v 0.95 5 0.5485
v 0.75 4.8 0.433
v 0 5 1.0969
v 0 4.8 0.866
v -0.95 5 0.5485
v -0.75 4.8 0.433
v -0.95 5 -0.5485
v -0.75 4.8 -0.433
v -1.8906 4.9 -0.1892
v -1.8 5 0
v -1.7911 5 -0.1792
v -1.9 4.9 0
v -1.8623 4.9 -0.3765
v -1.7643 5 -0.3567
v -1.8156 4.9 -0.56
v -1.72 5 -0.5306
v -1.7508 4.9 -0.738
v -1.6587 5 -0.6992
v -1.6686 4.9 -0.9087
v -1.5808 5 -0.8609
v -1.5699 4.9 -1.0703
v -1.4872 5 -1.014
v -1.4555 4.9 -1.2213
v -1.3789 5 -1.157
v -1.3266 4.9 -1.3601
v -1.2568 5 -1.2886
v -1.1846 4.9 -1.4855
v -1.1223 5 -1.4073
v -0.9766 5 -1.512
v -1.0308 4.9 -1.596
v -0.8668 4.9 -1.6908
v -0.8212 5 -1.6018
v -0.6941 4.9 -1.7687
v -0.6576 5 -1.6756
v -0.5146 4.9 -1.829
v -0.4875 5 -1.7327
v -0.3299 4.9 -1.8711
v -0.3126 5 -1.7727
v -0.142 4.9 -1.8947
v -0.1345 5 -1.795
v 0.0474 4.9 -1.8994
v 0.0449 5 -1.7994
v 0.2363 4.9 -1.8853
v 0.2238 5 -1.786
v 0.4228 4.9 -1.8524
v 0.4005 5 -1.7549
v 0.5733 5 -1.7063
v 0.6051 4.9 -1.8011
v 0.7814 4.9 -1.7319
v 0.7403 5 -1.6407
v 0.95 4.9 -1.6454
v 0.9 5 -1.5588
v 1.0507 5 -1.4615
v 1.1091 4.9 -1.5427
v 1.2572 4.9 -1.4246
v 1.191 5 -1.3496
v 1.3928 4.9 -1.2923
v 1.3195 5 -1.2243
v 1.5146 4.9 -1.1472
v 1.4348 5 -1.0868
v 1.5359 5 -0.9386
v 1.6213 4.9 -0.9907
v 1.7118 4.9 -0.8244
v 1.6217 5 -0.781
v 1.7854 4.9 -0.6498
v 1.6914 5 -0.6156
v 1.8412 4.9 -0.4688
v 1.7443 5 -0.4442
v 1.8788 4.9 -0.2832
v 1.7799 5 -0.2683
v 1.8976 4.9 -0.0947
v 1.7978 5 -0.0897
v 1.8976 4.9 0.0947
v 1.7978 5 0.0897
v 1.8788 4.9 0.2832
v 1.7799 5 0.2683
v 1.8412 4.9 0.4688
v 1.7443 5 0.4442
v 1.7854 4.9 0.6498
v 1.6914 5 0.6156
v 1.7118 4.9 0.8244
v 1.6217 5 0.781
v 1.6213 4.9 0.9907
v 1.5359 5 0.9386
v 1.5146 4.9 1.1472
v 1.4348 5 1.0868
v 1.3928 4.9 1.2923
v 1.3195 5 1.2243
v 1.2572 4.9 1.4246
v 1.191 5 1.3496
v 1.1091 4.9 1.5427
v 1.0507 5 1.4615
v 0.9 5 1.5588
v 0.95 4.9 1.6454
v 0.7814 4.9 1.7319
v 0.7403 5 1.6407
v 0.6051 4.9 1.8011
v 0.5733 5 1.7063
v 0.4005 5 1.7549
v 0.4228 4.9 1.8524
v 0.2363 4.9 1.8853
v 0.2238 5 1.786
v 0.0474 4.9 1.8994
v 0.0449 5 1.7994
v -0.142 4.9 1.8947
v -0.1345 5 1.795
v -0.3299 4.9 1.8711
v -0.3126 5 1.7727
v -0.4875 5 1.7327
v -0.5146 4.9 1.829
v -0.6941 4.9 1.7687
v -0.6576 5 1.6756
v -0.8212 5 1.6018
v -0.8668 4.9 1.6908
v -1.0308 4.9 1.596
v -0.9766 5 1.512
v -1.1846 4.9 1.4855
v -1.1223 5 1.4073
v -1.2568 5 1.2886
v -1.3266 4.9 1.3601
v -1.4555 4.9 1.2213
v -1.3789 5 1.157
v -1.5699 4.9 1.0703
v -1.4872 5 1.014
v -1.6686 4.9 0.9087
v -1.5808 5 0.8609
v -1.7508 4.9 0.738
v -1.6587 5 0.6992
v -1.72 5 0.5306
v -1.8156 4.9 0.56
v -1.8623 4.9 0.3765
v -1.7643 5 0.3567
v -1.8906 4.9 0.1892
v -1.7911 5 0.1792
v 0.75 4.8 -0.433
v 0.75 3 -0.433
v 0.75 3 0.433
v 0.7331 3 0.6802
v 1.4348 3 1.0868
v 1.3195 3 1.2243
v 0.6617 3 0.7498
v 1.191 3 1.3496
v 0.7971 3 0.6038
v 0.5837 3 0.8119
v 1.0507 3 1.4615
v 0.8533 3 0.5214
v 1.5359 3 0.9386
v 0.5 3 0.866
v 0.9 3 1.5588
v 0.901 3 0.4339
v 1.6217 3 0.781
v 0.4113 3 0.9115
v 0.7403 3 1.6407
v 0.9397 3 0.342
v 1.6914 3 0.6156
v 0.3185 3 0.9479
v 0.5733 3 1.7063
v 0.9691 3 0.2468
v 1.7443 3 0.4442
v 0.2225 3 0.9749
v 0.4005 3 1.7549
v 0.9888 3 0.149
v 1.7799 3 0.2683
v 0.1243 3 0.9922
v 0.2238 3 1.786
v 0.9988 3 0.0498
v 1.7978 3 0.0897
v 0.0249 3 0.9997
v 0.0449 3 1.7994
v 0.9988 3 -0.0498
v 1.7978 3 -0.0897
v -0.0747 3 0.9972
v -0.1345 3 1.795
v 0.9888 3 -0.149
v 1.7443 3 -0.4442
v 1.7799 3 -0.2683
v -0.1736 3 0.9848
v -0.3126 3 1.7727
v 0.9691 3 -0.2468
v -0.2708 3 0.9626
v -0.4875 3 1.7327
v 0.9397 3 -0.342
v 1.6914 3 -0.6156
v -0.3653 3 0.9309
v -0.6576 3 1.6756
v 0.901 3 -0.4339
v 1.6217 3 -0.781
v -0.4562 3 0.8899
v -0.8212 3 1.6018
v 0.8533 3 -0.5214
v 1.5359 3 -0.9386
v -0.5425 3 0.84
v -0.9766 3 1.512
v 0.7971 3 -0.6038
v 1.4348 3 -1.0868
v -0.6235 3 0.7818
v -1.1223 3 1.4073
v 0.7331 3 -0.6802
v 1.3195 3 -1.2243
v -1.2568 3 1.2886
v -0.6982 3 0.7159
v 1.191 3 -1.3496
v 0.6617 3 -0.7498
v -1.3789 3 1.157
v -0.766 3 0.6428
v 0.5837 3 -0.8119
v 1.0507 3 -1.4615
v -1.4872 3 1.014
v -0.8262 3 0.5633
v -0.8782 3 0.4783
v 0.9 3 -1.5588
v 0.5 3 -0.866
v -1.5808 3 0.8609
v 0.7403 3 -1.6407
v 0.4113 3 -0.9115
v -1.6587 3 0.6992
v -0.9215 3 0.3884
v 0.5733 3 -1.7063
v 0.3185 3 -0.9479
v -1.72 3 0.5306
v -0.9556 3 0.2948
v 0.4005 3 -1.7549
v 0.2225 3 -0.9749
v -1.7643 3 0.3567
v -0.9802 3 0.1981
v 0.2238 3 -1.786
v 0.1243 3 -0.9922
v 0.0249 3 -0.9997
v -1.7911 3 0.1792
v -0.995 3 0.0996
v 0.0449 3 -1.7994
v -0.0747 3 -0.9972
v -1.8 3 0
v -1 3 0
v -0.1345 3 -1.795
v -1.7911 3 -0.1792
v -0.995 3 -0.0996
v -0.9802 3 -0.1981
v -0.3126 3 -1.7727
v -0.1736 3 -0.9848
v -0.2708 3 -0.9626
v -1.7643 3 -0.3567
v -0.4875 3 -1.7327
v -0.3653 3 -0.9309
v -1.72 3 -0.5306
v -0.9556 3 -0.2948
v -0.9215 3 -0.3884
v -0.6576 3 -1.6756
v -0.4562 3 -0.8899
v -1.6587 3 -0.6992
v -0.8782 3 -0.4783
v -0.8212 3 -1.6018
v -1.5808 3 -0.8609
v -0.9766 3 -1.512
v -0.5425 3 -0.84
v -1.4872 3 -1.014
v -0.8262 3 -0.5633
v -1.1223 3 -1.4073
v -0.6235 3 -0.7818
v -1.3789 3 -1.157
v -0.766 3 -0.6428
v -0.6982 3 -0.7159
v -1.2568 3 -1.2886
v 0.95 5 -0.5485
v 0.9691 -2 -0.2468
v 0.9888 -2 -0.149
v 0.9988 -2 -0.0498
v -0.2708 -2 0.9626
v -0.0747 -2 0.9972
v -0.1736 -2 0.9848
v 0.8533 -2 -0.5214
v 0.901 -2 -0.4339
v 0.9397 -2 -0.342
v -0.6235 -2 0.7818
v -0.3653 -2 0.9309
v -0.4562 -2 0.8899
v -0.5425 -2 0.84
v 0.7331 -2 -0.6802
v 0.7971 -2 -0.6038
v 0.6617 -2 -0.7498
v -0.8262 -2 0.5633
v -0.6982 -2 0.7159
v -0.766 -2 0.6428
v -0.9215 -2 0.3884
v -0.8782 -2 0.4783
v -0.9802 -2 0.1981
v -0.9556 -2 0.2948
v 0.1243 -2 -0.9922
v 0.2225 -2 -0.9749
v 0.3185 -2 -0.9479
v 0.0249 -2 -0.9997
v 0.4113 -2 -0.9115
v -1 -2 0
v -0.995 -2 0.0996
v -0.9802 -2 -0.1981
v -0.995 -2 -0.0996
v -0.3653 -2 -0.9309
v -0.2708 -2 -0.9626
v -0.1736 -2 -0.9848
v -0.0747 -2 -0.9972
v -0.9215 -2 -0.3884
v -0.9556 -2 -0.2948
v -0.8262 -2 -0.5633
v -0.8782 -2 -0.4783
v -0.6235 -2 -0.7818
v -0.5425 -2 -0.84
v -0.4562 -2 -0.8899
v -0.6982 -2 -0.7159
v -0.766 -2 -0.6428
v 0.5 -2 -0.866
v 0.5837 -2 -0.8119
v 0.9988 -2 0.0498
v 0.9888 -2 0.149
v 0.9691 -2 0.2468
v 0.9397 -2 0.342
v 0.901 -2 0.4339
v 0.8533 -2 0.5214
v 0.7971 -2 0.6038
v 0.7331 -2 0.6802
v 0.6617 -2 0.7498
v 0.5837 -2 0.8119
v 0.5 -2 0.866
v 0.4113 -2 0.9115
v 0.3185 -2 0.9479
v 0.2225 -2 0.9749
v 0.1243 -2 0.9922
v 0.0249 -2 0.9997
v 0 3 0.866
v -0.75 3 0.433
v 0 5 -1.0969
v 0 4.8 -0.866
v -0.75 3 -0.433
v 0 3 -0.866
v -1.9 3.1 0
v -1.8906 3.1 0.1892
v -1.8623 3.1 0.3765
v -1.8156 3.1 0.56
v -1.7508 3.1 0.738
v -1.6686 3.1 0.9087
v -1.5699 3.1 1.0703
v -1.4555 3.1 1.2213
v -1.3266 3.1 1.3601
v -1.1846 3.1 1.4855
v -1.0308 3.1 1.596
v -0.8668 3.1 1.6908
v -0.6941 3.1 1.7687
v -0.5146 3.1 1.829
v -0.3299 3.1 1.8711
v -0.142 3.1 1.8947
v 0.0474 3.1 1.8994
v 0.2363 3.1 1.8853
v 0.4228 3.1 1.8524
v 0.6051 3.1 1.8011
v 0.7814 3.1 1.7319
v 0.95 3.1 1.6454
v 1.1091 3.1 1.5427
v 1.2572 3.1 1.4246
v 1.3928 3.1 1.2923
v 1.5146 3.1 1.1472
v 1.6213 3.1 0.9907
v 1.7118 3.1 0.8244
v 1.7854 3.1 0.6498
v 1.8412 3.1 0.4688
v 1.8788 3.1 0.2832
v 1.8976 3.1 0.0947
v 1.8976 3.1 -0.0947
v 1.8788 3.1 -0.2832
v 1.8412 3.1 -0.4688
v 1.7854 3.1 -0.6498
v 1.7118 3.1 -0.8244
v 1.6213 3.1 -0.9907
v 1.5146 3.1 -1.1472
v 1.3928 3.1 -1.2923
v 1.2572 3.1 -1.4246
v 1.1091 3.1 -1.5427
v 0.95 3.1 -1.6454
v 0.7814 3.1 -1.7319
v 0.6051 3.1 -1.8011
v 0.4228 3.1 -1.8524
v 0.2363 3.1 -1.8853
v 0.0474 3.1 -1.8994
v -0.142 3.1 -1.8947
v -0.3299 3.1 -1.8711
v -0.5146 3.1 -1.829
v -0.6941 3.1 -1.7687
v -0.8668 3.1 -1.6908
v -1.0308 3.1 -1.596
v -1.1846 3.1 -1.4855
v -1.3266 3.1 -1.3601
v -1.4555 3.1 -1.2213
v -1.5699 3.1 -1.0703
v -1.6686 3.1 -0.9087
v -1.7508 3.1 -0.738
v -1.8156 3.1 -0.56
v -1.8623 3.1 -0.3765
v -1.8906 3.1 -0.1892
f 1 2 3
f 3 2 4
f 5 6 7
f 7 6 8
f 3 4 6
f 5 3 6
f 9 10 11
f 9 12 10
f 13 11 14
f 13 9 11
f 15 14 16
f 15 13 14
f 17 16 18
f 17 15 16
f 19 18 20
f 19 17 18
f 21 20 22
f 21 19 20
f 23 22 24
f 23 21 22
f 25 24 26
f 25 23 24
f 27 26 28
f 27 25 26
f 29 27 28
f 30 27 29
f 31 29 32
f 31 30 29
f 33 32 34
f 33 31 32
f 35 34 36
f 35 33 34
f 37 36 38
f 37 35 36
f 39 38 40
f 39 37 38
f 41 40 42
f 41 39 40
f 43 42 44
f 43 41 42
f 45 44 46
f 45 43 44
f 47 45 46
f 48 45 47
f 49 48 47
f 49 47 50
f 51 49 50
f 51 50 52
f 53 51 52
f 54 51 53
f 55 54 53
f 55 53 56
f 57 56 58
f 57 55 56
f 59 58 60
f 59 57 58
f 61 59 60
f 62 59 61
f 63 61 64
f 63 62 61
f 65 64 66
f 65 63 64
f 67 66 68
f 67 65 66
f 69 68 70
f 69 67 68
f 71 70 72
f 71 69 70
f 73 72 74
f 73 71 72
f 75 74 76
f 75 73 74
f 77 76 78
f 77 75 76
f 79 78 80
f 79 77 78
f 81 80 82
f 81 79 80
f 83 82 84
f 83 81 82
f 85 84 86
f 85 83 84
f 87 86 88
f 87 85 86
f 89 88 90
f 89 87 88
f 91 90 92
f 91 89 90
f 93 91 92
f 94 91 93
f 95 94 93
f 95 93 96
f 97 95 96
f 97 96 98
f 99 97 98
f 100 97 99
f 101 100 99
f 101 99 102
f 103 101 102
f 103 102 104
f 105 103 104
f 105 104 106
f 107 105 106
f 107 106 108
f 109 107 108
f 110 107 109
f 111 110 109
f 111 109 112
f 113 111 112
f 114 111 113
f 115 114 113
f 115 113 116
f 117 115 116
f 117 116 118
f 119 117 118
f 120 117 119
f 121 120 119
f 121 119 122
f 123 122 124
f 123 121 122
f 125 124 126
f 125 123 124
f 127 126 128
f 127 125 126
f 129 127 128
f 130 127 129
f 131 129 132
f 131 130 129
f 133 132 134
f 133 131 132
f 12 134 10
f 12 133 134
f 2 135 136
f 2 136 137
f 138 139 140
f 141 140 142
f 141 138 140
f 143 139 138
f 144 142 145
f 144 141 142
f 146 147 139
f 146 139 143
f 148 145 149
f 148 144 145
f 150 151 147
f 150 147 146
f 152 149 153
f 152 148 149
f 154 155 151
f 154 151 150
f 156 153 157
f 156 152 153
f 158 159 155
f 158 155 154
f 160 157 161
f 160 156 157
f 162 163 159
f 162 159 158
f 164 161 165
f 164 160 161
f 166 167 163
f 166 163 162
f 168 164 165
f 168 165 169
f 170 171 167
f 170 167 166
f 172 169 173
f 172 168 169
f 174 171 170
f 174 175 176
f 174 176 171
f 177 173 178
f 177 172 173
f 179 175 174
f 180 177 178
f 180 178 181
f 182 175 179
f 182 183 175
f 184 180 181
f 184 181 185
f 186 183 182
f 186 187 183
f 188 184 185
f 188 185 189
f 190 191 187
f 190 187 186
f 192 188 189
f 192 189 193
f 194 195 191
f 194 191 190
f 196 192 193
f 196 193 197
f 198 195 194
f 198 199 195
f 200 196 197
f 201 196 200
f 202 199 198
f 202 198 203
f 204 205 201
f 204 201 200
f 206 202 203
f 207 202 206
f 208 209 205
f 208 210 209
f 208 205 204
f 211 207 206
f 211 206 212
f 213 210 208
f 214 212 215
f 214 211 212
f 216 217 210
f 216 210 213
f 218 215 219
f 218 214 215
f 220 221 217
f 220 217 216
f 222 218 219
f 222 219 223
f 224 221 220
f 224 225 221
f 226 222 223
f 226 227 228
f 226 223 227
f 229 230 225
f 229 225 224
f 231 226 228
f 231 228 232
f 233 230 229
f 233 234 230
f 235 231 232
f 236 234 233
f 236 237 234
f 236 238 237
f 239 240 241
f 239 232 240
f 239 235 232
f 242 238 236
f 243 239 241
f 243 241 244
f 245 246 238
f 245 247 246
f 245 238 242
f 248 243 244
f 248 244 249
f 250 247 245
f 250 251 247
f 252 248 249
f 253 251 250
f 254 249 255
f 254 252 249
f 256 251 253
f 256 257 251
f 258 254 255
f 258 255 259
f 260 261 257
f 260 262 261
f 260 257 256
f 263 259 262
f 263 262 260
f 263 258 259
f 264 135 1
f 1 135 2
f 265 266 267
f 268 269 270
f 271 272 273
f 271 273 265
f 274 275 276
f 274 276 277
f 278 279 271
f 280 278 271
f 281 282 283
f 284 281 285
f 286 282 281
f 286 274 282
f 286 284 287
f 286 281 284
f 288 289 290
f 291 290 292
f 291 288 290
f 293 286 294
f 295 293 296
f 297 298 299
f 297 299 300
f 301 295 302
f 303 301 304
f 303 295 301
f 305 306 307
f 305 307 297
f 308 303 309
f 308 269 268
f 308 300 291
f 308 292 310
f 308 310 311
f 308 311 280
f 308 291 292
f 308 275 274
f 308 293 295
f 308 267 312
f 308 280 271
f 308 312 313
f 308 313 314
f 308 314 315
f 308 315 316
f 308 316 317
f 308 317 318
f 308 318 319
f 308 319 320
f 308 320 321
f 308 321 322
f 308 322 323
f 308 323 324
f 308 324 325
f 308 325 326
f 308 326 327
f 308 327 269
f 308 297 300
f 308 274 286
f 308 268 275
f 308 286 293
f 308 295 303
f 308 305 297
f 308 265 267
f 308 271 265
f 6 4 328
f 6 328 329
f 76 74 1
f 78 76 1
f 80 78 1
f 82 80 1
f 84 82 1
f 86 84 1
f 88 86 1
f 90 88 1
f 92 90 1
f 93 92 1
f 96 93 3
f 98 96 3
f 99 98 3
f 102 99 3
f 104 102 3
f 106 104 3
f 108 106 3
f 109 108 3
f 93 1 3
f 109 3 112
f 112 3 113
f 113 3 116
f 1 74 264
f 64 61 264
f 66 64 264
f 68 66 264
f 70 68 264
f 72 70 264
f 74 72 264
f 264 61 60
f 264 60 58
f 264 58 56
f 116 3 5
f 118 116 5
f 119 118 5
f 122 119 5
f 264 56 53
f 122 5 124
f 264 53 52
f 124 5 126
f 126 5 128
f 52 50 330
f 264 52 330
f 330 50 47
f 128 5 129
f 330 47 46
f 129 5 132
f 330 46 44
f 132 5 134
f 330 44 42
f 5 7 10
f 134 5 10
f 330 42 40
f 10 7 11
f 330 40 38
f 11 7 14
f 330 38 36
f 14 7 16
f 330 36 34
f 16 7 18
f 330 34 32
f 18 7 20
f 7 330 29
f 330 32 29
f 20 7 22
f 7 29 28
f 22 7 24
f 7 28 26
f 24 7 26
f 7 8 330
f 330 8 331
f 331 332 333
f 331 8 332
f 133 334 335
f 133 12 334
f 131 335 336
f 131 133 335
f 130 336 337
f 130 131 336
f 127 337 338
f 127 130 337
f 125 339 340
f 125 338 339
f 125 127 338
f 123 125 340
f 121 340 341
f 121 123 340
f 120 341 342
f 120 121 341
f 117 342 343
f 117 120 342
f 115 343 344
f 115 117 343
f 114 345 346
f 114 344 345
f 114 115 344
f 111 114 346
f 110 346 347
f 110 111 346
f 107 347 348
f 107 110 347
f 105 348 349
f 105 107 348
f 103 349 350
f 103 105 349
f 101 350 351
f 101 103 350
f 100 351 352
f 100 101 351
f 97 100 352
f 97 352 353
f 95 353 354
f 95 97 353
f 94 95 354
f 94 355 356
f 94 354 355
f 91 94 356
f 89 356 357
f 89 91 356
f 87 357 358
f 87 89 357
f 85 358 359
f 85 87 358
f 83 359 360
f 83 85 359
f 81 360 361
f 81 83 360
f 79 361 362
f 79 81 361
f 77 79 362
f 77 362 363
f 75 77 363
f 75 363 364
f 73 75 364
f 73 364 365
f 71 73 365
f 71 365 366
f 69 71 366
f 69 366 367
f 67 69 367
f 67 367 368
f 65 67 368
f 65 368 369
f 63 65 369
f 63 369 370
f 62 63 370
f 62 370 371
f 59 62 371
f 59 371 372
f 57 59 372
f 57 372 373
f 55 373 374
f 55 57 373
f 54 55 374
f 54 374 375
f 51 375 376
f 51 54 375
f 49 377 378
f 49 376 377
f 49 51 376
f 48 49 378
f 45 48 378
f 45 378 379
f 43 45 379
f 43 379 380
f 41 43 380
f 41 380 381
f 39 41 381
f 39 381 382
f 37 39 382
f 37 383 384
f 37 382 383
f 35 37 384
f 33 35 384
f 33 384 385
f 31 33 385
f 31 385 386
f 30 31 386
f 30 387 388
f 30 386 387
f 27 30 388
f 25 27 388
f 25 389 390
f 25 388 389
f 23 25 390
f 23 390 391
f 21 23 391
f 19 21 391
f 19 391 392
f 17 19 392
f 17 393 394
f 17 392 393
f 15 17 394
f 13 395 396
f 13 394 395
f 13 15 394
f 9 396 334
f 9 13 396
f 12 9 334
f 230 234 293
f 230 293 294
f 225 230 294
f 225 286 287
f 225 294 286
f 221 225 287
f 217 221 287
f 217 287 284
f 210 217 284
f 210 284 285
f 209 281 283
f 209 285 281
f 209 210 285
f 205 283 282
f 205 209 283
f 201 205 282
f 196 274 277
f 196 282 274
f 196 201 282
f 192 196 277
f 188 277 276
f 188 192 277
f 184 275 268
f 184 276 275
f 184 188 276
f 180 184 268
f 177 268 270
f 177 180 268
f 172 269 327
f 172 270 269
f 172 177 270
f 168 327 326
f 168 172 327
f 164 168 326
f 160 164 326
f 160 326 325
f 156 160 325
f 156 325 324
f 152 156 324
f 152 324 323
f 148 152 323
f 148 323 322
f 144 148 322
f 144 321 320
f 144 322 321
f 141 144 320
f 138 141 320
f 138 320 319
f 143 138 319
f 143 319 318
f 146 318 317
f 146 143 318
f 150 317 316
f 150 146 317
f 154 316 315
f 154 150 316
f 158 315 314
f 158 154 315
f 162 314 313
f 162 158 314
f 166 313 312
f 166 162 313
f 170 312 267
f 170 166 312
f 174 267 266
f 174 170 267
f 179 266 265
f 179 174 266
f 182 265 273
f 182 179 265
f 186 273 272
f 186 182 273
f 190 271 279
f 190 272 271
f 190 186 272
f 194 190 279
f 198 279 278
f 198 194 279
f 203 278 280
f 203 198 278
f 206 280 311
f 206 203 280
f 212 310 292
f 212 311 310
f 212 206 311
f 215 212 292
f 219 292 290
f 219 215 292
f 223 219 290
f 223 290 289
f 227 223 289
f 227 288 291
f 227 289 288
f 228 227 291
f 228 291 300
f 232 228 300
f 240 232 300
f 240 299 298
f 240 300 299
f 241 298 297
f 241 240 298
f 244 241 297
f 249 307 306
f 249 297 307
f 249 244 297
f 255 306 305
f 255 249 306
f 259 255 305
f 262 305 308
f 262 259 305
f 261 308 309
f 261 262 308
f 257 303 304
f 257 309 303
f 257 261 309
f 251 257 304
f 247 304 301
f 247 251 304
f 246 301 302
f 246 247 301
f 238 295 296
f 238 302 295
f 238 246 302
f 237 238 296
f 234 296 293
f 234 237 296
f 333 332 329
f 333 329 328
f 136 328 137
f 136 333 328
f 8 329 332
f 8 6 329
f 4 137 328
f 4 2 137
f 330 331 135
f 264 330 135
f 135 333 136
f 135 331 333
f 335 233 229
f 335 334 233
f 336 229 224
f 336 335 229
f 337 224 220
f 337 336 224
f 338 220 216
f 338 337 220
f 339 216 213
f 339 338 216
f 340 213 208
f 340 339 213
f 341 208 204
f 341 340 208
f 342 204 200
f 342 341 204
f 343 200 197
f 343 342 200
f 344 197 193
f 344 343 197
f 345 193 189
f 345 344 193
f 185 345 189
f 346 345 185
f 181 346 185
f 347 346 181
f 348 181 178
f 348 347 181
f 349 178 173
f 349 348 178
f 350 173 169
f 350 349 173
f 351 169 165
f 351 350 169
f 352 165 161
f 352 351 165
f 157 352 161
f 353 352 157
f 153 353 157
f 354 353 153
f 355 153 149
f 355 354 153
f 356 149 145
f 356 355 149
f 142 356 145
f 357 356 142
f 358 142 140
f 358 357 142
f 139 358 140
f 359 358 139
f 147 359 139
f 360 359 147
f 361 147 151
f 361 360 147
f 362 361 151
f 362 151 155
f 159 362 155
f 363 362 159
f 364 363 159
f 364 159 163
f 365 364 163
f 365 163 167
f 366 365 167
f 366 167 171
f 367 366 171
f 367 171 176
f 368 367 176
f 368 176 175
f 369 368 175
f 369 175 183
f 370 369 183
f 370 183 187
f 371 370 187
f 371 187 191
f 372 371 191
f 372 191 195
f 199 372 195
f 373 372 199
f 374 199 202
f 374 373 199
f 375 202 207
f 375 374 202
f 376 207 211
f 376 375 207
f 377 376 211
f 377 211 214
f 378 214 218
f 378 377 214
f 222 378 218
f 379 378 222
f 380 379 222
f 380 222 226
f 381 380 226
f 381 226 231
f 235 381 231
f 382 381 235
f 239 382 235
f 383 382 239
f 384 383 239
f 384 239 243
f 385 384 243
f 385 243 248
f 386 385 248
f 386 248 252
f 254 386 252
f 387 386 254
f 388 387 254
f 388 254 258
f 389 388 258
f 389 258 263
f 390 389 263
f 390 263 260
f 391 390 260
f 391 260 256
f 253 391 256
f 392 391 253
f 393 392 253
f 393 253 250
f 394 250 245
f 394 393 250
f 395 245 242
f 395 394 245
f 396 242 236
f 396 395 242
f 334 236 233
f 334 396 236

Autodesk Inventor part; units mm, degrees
ref_plane "YZ Plane" through (0, 0, 0) normal (1, 0, 0) x (0, 1, 0)
ref_plane "XZ Plane" through (0, 0, 0) normal (0, 1, 0) x (-1, 0, 0)
ref_plane "XY Plane" through (0, 0, 0) normal (0, 0, 1) x (1, 0, 0)
sketch "スケッチ1" plane through (0, 0, 0) normal (0, 0, 1) x (1, 0, 0)
  line L0 (-1.9, 5) -> (0, 5)
  line L1 (1.9, 5) -> (1.9, 3)
  line L2 (1.9, 3) -> (-1.9, 3)
  line L3 (-1.9, 3) -> (-1.9, 5)
  line L4 (-1, 3) -> (0, 3)
  line L5 (1, 3) -> (1, -2)
  line L6 (1, -2) -> (0, -2)
  line L7 (-1, -2) -> (-1, 3)
  line L8 (0, 5) -> (0, -2)
  line L9 (0, 5) -> (1.9, 5)
  line L10 (0, 3) -> (1, 3)
  line L11 (0, -2) -> (-1, -2)
  point P0 (0, 0)
  dimension "d0" = 2
  dimension "d1" = 1
  dimension "d2" = 5
  dimension "d3" = 3.8
  dimension "d4" = 1.9
  dimension "d5" = 2
revolve "回転1" add sketch "スケッチ1" angle 360 about axis through (0, 5, 0) along (0, -1, 0) contours L0 L8 L2 L3 | L8 L11 L7 L2
thread "ねじ1" size "M2x0.4" class "6g" standard "ANSI Metric M Profile" full length
sketch "スケッチ2" plane through (0, 5, 0) normal (0, 1, 0) x (1, 0, 0)
  line L0 (0, 0.866) -> (0.75, 0.433)
  line L1 (0.75, 0.433) -> (0.75, -0.433)
  line L2 (0.75, -0.433) -> (0, -0.866)
  line L3 (0, -0.866) -> (-0.75, -0.433)
  line L4 (-0.75, -0.433) -> (-0.75, 0.433)
  line L5 (-0.75, 0.433) -> (0, 0.866)
  point P0 (0, 0)
  dimension "d9" = 1.5
extrude "押し出し1" cut sketch "スケッチ2" against normal blind 2
chamfer "面取り1" distance 0.1 angle 45 2 edges at (1.9, 5, 0) (1.9, 3, 0)
chamfer "面取り2" distance 0.2 angle 45 6 edges at (0.375, 5, 0.6495) (-0.375, 5, 0.6495) (-0.75, 5, 0) (-0.375, 5, -0.6495) (0.375, 5, -0.6495) (0.75, 5, 0)
equation "\"d1\" = 0.5 * d0"
equation "\"d4\" = 0.5 * d3"
properties part number "M2_5mm"
